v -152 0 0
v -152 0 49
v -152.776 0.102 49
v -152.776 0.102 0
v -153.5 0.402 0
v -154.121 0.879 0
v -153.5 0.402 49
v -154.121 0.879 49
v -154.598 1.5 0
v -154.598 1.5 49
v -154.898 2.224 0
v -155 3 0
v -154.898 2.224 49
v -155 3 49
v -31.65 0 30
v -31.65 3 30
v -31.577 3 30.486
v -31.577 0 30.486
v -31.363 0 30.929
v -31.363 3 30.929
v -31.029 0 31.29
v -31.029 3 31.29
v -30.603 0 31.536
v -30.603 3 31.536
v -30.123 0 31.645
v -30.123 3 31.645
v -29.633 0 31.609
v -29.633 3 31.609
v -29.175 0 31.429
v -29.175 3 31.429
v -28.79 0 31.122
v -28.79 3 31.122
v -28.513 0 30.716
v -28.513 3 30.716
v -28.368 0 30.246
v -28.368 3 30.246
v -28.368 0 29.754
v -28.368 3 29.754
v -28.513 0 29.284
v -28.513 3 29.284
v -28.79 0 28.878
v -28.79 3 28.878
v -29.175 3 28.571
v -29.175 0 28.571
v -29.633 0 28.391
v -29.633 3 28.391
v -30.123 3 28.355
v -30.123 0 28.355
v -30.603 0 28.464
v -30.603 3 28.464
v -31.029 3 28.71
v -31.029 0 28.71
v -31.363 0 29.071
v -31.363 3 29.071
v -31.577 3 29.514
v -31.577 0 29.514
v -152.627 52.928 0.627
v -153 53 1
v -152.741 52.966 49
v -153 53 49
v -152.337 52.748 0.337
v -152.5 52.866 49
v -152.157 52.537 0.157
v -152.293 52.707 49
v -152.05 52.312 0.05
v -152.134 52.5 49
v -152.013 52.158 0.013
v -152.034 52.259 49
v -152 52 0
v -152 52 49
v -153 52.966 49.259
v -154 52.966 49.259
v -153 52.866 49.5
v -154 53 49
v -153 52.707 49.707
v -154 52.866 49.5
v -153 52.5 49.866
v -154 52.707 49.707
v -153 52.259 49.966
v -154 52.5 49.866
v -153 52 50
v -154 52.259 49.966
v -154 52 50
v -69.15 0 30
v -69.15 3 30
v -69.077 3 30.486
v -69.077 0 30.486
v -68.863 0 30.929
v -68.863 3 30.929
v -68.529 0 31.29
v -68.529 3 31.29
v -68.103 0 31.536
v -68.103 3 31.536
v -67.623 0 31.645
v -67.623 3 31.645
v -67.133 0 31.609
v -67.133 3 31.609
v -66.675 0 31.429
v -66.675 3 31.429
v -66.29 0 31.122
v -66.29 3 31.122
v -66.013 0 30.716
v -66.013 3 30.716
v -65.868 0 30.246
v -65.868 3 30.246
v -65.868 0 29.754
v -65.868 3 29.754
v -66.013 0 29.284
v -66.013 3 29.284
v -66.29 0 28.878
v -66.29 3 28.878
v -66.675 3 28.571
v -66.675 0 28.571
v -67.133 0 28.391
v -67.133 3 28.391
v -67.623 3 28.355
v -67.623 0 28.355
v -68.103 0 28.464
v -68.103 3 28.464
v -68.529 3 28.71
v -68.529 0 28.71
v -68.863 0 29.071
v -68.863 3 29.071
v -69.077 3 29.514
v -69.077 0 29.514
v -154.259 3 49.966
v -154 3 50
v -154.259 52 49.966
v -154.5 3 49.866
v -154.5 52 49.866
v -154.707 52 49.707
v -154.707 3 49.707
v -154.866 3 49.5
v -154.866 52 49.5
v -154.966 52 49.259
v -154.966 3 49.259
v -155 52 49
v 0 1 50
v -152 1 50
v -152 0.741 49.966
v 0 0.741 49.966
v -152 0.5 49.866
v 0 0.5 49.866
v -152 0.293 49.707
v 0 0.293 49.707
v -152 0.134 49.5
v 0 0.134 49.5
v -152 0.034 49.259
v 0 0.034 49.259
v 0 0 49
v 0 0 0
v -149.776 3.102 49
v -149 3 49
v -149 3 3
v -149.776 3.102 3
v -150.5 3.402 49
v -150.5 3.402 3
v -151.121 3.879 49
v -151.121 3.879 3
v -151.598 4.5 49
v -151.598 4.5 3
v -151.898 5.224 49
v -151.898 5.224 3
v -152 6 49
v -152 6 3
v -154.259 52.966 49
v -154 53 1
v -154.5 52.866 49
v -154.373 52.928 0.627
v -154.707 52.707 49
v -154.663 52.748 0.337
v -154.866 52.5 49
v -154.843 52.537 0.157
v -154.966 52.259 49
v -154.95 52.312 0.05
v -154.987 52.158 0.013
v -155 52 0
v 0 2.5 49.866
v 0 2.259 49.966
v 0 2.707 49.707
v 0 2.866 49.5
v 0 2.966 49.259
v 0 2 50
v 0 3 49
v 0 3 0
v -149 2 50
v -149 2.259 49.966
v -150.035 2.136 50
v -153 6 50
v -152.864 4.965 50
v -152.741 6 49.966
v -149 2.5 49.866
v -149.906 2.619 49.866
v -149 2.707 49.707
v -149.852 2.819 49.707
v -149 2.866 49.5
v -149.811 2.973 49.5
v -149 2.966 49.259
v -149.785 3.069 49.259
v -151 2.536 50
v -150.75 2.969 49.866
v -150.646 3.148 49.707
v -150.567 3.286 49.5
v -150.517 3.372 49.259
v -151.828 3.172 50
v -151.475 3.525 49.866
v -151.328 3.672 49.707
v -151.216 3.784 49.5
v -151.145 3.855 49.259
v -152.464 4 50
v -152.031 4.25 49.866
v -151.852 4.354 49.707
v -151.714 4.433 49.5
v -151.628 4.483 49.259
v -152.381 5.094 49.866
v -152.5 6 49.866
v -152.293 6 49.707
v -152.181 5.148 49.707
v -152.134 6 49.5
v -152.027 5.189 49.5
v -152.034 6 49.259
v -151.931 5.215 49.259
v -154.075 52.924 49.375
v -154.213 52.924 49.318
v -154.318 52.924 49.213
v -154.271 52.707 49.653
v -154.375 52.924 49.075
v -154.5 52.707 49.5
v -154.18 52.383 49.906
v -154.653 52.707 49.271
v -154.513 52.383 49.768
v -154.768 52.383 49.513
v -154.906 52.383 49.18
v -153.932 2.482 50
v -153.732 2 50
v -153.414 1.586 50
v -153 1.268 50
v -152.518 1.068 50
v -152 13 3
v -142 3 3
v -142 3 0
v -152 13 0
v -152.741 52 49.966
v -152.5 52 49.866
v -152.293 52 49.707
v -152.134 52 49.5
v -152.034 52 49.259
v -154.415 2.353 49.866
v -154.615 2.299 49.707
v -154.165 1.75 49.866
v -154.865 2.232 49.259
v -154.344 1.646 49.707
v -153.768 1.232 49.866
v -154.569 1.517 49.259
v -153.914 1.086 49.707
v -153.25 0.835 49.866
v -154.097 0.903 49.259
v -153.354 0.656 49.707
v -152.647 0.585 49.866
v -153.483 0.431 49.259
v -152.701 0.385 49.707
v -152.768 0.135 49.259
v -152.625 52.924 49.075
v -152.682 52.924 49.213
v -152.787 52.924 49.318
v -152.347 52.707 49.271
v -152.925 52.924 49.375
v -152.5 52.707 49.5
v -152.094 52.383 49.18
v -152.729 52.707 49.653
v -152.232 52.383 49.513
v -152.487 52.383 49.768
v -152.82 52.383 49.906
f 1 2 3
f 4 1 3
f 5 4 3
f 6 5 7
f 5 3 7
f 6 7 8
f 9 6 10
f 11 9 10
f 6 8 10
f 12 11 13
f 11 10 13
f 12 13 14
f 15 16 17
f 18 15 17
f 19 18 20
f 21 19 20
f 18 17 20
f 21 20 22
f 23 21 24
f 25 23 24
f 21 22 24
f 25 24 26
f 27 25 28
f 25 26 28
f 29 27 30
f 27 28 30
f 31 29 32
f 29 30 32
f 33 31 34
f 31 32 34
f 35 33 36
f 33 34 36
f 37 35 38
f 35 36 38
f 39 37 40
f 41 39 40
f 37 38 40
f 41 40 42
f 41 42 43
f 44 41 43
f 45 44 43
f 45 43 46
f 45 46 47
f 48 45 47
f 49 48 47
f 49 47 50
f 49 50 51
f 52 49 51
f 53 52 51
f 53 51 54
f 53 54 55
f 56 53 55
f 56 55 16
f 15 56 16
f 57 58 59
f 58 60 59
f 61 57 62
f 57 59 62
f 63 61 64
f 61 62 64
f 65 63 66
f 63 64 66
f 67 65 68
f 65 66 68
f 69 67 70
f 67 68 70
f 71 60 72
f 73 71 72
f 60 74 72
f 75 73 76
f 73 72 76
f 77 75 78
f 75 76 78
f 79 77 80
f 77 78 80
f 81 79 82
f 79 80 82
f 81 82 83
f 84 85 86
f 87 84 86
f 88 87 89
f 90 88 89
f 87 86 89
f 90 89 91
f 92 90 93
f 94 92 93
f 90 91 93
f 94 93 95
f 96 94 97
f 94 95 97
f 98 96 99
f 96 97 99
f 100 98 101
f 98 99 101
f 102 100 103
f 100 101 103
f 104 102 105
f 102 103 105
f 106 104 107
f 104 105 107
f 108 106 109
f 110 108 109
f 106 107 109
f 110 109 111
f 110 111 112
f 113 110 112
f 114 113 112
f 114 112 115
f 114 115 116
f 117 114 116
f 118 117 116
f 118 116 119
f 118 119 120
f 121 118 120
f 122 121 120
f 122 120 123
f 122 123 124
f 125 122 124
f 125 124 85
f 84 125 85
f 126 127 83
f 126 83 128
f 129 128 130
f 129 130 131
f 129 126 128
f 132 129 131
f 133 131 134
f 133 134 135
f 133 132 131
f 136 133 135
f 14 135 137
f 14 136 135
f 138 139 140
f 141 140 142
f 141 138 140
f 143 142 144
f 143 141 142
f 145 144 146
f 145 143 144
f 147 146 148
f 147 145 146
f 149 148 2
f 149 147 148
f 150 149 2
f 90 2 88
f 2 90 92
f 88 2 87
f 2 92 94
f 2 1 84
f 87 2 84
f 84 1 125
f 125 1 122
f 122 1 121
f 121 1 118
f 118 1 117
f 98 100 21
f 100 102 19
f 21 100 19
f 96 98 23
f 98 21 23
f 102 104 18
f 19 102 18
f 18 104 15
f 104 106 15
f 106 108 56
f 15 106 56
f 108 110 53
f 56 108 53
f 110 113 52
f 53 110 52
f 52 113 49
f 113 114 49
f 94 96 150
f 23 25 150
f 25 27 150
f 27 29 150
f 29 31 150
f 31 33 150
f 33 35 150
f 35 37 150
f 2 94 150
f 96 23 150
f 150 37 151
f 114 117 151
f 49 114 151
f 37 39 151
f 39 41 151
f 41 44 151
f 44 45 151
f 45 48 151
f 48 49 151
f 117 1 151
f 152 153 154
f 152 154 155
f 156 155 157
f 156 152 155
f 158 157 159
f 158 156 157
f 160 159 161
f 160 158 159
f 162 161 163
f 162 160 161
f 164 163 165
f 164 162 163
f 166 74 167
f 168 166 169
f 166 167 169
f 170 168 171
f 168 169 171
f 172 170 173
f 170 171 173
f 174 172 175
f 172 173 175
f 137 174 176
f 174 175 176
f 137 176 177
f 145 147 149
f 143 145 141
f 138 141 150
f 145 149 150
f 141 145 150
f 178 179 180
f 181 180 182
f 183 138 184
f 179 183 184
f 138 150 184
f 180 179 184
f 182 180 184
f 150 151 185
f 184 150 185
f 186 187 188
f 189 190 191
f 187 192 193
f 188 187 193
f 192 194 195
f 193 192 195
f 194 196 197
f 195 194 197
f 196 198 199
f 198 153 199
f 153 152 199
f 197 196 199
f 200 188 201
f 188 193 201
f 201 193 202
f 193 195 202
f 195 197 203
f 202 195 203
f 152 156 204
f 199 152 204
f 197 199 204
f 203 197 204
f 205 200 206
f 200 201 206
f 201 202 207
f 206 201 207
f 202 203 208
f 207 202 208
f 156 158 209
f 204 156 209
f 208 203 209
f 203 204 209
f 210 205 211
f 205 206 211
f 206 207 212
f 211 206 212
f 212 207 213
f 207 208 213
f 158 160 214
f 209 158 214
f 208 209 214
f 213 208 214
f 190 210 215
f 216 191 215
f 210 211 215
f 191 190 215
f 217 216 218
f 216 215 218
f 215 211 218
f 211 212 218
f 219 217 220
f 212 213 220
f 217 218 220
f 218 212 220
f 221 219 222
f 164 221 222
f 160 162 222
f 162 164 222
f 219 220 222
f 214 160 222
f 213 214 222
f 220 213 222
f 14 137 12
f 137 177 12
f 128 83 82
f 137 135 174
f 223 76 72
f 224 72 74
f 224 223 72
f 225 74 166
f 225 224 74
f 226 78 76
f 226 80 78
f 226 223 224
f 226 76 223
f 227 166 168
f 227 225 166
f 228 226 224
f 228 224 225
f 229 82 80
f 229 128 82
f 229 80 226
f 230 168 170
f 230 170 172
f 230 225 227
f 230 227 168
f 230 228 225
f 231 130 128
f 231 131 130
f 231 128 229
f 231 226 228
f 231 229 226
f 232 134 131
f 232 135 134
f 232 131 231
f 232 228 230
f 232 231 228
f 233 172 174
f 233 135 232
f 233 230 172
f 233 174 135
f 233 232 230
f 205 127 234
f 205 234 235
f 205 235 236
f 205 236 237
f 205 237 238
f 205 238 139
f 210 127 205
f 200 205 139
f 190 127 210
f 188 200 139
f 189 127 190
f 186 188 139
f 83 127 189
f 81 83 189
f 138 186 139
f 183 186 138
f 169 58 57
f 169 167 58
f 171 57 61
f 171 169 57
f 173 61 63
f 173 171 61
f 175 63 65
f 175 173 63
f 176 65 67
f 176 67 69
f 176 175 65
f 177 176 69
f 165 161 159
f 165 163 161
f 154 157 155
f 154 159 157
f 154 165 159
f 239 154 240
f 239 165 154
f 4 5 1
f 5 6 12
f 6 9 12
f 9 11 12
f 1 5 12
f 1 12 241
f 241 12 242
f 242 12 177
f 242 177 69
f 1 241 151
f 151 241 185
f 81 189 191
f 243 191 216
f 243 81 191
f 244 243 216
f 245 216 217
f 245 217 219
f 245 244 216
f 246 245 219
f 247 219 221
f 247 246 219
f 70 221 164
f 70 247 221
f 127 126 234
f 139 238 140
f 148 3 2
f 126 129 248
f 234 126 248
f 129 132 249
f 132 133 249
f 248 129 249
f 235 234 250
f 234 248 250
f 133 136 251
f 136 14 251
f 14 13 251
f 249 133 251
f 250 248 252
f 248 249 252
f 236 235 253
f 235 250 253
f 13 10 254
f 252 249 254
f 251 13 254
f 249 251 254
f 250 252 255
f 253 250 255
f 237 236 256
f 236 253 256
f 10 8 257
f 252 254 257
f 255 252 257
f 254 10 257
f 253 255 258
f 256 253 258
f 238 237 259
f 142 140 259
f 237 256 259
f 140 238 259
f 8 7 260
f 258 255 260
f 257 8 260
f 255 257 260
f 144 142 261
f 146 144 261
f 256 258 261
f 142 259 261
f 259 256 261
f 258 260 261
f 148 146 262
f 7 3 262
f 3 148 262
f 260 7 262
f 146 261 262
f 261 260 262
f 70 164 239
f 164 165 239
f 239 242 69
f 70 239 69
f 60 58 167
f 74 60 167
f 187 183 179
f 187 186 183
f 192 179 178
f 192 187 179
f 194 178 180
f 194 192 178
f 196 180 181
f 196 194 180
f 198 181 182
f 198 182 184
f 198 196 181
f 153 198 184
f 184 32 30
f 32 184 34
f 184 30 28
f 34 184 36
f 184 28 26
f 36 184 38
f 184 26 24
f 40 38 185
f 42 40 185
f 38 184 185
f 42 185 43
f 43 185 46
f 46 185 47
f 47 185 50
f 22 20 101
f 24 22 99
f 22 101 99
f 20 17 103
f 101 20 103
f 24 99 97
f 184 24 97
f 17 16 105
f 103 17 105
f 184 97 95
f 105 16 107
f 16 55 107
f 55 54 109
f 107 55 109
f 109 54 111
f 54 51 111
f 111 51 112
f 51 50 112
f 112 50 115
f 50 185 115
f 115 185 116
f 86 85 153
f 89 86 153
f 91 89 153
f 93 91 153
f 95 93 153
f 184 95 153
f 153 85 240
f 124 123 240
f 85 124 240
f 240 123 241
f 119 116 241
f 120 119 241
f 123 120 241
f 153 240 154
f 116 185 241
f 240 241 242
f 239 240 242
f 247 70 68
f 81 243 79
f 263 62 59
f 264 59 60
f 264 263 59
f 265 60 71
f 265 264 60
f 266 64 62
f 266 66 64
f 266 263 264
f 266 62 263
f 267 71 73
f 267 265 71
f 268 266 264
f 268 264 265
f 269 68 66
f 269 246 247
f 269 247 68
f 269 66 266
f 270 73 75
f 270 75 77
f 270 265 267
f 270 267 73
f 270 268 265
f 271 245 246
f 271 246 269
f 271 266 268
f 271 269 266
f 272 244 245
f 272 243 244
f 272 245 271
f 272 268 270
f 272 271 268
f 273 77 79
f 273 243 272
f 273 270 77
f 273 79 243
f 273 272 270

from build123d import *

# Parameters (mm, degrees)
F1_DEPTH = 50
F2_DEPTH = 3
F3_R     = 3
F4_R     = 3
F6_D     = 3.3
F7_R     = 1
F8_R     = 1


with BuildPart() as f1:
    # F0 (on Top) → F1 (new body)
    with BuildSketch(Plane.XY):
        Polygon((-155, 0), (0, 0), (0, 3), (-142, 3), (-152, 3), (-152, 13), (-152, 53), (-155, 53), (-155, 3), align=None)
    extrude(amount=F1_DEPTH)

    # F0 (on Top) → F2 (join)
    with BuildSketch(Plane.XY):
        Polygon((-152, 3), (-142, 3), (-152, 13), align=None)
    extrude(amount=F2_DEPTH)

    # F3
    f3_edges = [f1.edges().sort_by_distance(p)[0] for p in [
        (-152, 3, 26.5),
    ]]
    fillet(f3_edges, radius=F3_R)

    # F4
    f4_edges = [f1.edges().sort_by_distance(p)[0] for p in [
        (-155, 0, 25),
    ]]
    fillet(f4_edges, radius=F4_R)

    # F6 (through all)
    with Locations(Plane.XZ):
        with Locations((-30, 30), (-67.5, 30)):
            Hole(F6_D / 2)

    # F7
    f7_edges = [f1.edges().sort_by_distance(p)[0] for p in [
        (-76, 0, 50),
        (-74.5, 3, 50),
        (-155, 28, 50),
        (-152, 29.5, 50),
        (-151.12132, 3.87868, 50),
        (-154.12132, 0.87868, 50),
    ]]
    fillet(f7_edges, radius=F7_R)

    # F8
    f8_edges = [f1.edges().sort_by_distance(p)[0] for p in [
        (-152, 53, 24.5),
        (-155, 53, 24.5),
        (-152.292893, 53, 49.707107),
        (-153.5, 53, 0),
        (-153.5, 53, 50),
        (-154.707107, 53, 49.707107),
    ]]
    fillet(f8_edges, radius=F8_R)


solid = f1.part
